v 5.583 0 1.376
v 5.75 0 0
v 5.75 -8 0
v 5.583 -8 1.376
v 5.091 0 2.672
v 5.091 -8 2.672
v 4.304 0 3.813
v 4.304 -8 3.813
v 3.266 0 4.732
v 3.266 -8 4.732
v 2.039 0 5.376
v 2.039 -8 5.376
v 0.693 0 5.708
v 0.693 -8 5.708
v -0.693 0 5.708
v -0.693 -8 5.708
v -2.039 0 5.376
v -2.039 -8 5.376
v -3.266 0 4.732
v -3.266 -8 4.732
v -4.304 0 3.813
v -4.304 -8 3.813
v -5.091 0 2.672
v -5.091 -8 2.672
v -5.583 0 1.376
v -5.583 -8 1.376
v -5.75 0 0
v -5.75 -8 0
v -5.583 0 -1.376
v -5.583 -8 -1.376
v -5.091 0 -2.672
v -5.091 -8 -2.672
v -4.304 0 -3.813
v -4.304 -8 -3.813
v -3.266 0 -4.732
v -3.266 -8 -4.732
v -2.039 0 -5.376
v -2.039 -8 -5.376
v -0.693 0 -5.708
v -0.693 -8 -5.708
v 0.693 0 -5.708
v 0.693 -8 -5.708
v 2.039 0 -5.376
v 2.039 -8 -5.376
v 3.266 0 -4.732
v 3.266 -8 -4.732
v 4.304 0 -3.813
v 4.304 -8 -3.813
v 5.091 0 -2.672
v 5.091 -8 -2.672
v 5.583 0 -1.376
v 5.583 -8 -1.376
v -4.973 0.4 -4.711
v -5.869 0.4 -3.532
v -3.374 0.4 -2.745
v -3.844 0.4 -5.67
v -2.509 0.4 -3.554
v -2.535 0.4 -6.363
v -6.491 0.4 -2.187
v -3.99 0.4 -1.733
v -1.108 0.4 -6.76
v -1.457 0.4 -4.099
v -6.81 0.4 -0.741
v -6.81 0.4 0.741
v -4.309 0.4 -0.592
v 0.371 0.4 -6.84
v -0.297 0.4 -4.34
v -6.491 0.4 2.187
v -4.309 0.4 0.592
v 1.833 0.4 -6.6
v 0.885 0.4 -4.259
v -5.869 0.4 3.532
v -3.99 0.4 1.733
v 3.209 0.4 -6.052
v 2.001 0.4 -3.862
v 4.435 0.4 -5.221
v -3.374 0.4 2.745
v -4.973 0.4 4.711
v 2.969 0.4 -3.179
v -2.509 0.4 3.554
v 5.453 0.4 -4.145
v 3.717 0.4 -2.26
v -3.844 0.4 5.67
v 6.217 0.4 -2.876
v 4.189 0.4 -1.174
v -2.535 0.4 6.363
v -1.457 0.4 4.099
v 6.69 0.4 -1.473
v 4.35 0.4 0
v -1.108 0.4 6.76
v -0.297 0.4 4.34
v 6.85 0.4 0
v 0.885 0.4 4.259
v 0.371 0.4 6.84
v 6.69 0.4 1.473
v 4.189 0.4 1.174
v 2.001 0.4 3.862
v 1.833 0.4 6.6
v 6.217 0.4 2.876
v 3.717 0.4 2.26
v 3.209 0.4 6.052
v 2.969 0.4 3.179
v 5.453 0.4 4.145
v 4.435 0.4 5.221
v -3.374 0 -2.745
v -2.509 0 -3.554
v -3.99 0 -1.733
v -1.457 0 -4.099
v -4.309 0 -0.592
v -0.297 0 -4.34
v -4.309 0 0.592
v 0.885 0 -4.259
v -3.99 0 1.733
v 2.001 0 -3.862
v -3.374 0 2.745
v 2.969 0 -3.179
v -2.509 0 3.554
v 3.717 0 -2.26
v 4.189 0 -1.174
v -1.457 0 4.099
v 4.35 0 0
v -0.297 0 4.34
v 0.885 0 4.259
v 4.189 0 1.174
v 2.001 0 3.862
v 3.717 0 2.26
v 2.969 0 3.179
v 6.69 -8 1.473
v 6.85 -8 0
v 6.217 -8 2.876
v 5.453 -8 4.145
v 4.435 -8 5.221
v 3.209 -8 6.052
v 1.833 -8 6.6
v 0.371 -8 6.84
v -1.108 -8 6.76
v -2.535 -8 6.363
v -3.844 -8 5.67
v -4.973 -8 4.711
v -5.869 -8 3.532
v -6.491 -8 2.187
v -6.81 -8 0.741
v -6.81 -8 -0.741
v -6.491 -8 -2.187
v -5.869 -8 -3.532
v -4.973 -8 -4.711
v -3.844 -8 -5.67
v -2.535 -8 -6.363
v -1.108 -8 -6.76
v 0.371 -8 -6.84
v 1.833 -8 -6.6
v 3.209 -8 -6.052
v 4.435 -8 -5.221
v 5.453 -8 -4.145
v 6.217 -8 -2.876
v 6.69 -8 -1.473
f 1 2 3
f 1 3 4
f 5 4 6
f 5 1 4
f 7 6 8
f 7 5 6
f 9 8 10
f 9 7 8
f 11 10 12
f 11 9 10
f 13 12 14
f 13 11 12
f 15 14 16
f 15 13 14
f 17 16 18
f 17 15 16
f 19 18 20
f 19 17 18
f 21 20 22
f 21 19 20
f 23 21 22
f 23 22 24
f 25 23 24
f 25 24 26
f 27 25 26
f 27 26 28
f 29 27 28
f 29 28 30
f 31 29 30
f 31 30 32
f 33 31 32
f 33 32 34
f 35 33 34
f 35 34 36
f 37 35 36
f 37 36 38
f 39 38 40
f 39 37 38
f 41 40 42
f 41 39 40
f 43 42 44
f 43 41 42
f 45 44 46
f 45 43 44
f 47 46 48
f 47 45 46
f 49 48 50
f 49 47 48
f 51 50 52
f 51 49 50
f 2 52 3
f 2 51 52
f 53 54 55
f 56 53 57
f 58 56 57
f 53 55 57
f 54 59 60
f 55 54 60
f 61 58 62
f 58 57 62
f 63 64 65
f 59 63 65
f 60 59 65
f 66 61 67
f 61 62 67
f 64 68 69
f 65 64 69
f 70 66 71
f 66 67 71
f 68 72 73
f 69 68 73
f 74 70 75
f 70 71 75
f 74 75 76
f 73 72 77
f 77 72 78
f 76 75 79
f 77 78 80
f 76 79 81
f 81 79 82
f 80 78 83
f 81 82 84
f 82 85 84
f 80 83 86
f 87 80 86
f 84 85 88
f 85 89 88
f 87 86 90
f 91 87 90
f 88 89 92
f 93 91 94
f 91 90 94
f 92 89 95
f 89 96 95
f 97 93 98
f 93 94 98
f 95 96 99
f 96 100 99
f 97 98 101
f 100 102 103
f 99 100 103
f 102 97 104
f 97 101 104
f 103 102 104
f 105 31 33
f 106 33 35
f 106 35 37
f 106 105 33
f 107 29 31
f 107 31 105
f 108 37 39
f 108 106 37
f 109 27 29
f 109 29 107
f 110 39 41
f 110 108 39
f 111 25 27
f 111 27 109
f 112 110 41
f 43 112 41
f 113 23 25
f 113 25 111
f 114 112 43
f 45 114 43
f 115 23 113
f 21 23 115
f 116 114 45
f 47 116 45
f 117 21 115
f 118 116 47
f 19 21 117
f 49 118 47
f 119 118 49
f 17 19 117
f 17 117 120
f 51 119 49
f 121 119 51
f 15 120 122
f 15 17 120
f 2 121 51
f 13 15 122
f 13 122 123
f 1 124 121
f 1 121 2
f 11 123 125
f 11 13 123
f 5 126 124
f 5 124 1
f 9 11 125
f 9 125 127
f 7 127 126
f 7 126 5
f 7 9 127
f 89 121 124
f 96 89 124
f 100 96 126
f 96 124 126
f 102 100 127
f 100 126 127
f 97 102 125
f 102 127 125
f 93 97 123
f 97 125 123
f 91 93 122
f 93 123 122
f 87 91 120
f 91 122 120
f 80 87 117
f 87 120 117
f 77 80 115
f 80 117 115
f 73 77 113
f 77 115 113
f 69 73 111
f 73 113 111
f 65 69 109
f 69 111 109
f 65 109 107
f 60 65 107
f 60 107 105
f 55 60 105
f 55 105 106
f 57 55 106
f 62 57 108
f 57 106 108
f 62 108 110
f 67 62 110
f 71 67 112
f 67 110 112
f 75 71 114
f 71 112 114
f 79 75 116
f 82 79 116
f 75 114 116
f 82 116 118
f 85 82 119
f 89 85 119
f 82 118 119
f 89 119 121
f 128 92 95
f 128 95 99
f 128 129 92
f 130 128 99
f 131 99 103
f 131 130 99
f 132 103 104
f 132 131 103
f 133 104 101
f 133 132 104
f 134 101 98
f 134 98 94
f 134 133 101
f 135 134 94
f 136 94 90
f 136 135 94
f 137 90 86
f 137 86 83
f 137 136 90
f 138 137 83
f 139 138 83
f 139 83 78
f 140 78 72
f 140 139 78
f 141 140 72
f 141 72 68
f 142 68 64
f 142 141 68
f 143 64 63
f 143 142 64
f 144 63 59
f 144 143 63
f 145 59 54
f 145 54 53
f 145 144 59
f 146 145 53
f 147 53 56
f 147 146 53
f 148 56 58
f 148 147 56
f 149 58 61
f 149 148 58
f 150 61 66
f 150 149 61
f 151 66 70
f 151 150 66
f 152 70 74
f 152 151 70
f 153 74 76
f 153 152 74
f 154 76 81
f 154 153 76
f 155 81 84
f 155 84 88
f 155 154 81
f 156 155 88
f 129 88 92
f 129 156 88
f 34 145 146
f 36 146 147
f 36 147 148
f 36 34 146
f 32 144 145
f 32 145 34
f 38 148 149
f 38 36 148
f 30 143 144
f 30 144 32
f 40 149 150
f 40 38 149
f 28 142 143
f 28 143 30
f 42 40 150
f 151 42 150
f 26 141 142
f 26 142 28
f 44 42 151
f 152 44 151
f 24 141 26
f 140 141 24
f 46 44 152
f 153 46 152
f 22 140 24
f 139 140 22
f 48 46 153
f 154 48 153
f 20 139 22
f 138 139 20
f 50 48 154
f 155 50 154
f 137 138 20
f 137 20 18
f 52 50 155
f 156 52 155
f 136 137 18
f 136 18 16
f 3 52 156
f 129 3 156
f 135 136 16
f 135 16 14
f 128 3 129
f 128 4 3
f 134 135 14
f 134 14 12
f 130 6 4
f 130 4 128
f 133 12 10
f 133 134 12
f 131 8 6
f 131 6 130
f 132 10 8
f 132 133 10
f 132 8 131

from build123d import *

# Parameters (mm, degrees)
F0_R     = 6.85
F0_R_2   = 5.75
F0_R_3   = 4.35
F1_DEPTH = 8
F2_DEPTH = 25
F3_DEPTH = 0.4


with BuildPart() as f1:
    # F0 (on Front) → F1 (new body)
    with BuildSketch(Plane.XZ):
        Circle(F0_R)
        Circle(F0_R_2, mode=Mode.SUBTRACT)
        Circle(F0_R_2)
        Circle(F0_R_3, mode=Mode.SUBTRACT)
        Circle(F0_R_3)
    extrude(amount=F1_DEPTH)

    # F0 (on Front) → F2 (cut)
    with BuildSketch(Plane.XZ):
        Circle(F0_R_2)
        Circle(F0_R_3, mode=Mode.SUBTRACT)
        Circle(F0_R_3)
    extrude(amount=F2_DEPTH, mode=Mode.SUBTRACT)

    # F0 (on Front) → F3 (join)
    with BuildSketch(Plane.XZ):
        Circle(F0_R)
        Circle(F0_R_2, mode=Mode.SUBTRACT)
        Circle(F0_R_2)
        Circle(F0_R_3, mode=Mode.SUBTRACT)
    extrude(amount=-F3_DEPTH)


solid = f1.part
